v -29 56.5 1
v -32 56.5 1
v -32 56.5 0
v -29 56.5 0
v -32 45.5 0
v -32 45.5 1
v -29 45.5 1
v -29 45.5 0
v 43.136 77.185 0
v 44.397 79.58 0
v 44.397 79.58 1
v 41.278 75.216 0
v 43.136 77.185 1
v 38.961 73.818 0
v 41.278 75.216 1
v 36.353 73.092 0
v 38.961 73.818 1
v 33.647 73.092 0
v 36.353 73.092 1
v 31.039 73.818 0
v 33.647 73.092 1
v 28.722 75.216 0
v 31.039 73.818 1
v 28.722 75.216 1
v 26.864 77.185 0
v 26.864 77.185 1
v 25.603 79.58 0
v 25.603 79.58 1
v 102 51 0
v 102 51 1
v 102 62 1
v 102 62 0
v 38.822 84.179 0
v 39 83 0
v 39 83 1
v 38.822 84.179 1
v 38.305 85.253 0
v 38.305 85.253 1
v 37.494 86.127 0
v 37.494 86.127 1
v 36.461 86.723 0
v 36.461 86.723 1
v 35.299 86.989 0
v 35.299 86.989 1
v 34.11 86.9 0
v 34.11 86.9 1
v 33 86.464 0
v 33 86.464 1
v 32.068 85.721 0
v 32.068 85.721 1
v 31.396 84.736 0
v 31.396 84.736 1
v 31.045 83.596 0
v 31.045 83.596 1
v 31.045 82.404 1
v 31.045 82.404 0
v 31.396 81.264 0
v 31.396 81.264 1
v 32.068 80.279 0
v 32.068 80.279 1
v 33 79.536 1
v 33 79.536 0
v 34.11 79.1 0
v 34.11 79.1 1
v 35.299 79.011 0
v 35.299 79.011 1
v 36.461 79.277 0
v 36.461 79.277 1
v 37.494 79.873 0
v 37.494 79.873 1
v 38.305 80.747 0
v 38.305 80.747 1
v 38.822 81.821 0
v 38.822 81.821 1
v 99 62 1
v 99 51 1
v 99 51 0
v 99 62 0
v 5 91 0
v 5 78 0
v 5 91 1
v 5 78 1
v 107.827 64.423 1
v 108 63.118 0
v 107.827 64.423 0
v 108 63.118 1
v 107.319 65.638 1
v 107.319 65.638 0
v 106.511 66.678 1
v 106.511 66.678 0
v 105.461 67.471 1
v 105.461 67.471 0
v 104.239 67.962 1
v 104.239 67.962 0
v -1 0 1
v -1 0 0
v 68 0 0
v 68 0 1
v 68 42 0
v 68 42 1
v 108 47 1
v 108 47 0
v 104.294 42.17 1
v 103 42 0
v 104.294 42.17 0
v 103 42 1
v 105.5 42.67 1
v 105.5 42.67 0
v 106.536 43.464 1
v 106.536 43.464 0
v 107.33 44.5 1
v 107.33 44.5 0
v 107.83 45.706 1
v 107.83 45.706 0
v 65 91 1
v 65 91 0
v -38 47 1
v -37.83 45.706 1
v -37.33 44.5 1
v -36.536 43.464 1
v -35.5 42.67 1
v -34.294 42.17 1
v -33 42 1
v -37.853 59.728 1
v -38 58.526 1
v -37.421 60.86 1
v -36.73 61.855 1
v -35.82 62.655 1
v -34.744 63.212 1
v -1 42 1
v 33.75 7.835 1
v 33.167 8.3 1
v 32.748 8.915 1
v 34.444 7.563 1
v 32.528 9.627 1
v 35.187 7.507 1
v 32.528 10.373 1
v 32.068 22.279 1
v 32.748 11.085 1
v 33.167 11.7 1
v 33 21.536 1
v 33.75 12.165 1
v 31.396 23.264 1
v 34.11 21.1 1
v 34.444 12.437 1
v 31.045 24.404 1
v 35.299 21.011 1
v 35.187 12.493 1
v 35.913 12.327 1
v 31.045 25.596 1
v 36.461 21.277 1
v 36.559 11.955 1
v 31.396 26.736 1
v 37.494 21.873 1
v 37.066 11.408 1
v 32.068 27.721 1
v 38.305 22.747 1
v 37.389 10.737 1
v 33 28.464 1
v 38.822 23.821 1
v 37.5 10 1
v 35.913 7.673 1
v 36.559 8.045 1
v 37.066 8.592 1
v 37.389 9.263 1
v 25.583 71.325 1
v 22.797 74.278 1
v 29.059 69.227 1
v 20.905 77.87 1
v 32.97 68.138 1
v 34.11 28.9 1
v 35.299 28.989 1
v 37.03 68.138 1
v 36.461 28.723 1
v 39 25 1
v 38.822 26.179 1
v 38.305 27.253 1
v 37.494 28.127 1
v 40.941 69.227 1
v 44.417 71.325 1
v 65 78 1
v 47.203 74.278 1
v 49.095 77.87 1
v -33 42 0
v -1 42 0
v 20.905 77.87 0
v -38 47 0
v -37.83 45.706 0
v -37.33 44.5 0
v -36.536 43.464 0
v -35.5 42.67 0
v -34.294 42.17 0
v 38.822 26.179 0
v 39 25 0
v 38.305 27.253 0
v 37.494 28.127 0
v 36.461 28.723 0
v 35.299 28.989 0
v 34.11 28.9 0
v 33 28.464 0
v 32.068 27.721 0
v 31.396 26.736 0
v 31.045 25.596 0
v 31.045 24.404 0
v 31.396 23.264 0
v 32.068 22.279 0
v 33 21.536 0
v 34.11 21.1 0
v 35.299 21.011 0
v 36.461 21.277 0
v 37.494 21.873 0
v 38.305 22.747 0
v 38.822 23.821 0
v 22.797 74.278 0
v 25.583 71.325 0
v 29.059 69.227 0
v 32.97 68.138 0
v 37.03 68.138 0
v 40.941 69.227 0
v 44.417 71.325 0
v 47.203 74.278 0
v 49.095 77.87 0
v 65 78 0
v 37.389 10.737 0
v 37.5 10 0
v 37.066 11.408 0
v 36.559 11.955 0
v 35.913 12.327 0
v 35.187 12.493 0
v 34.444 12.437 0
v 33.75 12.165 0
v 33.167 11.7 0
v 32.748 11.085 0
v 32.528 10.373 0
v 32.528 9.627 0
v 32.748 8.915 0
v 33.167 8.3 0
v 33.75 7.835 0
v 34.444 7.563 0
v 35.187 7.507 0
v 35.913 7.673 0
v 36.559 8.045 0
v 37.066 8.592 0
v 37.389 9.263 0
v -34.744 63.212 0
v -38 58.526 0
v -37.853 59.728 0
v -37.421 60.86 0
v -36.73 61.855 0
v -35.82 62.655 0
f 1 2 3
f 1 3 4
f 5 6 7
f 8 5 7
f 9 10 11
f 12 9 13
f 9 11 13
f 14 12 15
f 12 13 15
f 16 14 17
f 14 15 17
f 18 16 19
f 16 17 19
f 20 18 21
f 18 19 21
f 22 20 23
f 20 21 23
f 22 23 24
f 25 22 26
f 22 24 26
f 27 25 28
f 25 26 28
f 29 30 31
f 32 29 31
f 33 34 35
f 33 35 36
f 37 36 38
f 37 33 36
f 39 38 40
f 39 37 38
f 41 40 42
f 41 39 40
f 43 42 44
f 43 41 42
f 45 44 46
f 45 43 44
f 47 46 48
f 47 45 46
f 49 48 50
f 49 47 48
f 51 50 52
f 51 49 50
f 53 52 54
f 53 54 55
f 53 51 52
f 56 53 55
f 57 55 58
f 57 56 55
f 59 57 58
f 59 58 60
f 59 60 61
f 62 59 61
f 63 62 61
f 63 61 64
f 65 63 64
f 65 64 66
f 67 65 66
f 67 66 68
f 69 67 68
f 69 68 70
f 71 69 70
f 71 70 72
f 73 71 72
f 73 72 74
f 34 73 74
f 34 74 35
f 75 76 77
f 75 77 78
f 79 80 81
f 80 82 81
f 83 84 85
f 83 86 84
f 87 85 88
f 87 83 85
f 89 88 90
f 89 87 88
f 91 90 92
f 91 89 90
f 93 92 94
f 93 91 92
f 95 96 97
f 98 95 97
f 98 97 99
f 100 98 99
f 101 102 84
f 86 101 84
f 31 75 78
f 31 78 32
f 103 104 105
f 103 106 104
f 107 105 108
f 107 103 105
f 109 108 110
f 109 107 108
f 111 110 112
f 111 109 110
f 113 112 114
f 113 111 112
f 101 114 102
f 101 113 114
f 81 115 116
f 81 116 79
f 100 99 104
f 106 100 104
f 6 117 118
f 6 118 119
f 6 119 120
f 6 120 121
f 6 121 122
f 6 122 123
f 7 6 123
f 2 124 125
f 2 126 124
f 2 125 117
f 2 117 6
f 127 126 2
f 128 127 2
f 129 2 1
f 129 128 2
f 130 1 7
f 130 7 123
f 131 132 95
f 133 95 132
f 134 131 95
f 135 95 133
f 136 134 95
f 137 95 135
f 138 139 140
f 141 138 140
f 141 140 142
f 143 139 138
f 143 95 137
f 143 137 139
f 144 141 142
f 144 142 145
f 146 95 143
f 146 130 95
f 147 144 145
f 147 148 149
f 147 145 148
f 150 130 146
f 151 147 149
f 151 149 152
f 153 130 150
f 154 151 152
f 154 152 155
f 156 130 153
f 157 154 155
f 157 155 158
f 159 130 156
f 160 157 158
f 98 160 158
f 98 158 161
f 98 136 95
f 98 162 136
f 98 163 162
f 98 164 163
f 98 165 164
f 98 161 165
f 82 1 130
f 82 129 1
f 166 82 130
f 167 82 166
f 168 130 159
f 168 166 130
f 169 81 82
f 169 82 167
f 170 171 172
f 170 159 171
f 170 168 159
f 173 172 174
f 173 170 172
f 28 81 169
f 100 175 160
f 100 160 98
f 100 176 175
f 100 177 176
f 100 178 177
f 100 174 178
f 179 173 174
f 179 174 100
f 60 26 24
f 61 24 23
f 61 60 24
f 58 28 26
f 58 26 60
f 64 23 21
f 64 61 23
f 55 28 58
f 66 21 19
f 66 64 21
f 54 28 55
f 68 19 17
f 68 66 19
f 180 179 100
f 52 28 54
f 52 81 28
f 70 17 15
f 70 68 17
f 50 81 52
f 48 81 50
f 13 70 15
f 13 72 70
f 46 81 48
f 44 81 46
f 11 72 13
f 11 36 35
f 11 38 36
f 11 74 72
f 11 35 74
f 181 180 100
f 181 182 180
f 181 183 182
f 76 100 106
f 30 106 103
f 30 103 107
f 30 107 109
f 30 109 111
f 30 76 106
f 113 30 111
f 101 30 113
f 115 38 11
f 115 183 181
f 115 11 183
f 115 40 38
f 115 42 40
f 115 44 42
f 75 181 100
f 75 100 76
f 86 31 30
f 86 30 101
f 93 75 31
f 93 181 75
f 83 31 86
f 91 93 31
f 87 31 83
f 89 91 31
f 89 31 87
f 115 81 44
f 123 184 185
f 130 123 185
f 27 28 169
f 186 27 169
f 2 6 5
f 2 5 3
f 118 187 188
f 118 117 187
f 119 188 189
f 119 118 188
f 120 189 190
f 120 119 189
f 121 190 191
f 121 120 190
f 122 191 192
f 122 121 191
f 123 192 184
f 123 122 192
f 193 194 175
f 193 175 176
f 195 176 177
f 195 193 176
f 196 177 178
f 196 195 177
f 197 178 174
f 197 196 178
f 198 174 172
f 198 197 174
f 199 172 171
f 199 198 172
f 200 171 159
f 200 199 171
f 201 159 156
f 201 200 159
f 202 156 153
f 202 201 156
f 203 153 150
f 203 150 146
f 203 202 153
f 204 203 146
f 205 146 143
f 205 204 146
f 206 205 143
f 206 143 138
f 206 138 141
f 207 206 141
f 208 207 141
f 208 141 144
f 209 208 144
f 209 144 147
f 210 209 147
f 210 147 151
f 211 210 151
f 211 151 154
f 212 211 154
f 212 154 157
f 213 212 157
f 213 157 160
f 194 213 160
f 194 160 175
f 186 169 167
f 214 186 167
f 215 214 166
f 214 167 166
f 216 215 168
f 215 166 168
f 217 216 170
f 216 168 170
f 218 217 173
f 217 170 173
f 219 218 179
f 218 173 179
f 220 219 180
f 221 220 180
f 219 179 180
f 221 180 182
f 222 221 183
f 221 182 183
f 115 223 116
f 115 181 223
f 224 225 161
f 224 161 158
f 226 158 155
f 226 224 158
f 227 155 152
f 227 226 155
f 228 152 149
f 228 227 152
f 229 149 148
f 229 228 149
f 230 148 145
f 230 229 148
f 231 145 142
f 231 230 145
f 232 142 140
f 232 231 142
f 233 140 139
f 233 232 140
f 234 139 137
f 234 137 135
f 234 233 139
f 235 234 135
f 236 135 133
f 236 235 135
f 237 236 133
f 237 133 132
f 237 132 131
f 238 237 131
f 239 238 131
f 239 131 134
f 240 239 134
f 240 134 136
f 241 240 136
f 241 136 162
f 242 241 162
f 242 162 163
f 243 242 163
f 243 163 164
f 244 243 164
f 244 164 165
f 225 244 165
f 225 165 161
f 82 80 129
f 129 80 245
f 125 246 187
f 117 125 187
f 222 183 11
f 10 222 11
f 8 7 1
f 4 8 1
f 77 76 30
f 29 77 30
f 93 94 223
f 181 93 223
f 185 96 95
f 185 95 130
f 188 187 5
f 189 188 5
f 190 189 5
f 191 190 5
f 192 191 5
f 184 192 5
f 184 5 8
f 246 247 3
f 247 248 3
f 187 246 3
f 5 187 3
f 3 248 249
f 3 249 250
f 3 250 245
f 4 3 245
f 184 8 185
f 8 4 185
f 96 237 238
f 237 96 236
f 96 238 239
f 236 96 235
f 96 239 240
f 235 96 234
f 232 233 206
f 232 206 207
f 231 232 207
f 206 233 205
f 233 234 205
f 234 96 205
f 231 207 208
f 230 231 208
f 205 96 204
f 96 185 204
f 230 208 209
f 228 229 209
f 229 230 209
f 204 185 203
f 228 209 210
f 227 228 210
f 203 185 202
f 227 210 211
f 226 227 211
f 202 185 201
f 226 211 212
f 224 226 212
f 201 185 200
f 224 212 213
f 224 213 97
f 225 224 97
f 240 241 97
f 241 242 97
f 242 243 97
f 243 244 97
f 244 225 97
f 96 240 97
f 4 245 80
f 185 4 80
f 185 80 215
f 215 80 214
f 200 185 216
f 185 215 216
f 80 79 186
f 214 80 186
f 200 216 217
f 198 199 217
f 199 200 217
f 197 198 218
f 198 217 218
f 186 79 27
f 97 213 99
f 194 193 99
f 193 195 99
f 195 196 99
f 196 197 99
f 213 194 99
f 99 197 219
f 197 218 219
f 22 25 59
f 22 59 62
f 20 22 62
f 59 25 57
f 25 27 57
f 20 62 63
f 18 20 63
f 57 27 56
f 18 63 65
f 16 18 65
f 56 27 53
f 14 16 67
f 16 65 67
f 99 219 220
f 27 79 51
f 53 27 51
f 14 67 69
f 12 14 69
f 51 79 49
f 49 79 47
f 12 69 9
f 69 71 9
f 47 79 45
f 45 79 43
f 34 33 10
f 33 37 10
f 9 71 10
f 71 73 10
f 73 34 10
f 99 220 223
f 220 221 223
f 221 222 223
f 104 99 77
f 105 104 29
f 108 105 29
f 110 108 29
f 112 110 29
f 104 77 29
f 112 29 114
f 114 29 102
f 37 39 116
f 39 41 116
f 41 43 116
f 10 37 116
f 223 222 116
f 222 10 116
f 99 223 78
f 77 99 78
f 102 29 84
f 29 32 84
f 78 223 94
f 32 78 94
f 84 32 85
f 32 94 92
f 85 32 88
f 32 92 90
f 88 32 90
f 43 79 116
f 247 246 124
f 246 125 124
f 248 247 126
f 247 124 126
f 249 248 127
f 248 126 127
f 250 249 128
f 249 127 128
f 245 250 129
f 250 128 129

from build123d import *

# Parameters (mm, degrees)
SKETCH1_W                    = 68
SKETCH1_H                    = 42
BOSS_EXTRUDE1_DEPTH          = 1
SKETCH3_W                    = 1
SKETCH3_H                    = 42
EXTRUDE_THIN1_DEPTH          = 20
SKETCH4_R                    = 5
CUT_EXTRUDE1_DEPTH           = 144.394560566
SKETCH6_W                    = 3
SKETCH6_H                    = 11
CUT_EXTRUDE2_DEPTH           = 143.779550356
SKETCH6_3_R                  = 4
BOSS_EXTRUDE2_DEPTH          = 15
SKETCH6_4_R                  = 2.5
SKETCH6_4_R_2                = 4
BOSS_EXTRUDE3_DEPTH          = 6
SKETCH7_W                    = 1
SKETCH7_H                    = 42
BOSS_EXTRUDE5_DEPTH          = 1
FILLET2_R                    = 5
SKETCH8_W                    = 60
SKETCH8_H                    = 1
BOSS_EXTRUDE6_DEPTH          = 20
CONVERT_SOLID1_START         = -20
CONVERT_SOLID1_OUTLINE_W     = 1
CONVERT_SOLID1_OUTLINE_H     = 42
CONVERT_SOLID1_OUTLINE_W_2   = 60
CONVERT_SOLID1_OUTLINE_H_2   = 1
CONVERT_SOLID1_DEPTH         = 20
CONVERT_SOLID1_2_OUTLINE_R   = 2.5
CONVERT_SOLID1_2_OUTLINE_R_2 = 4
CONVERT_SOLID1_2_DEPTH       = 16


# Read off the part's stored shape, not the designer's step: Convert-Solid1
with BuildPart() as part:
    # Sketch1 → Boss-Extrude1 (new body)
    with BuildSketch(Plane.XY):
        Polygon((-38, 62), (-38, 42), (0, 42), (68, 42), (108, 42), (108, 67), (65, 78), (65, 91), (5, 91), (5, 78), align=None)
        with Locations((34, 21)):
            Rectangle(SKETCH1_W, SKETCH1_H)
    extrude(amount=BOSS_EXTRUDE1_DEPTH)

    # Sketch3 → Extrude-Thin1 (add)
    with BuildSketch(Plane(origin=(0, 0, 0), x_dir=(-1, 0, 0), z_dir=(0, 0, -1))):
        with Locations((0.5, 21)):
            Rectangle(SKETCH3_W, SKETCH3_H)
        with Locations((-67.5, 21)):
            Rectangle(SKETCH3_W, SKETCH3_H)
    extrude(amount=EXTRUDE_THIN1_DEPTH)


with BuildPart() as extrude_thin1_piece_1:
    # of the separate pieces the step leaves, piece 1, a body of its own (extrude_thin1_pieces)
    add(part.part.solids().sort_by_distance((-38, 62, 0))[0])


with BuildPart() as extrude_thin1_piece_2:
    # of the separate pieces the step leaves, piece 2, a body of its own (extrude_thin1_pieces)
    add(part.part.solids().sort_by_distance((0, 42, -20))[0])


with BuildPart() as cut_extrude1_tool:
    # Sketch4 → Cut-Extrude1 (new, through all)
    with BuildSketch(Plane.ZY.offset(1)):
        with Locations((-9.5, 15)):
            Circle(SKETCH4_R)
    extrude(amount=-CUT_EXTRUDE1_DEPTH)


with BuildPart() as extrude_thin1_piece_1_1:
    add(extrude_thin1_piece_1.part)

    # Cut-Extrude1: cut by cut_extrude1_tool
    add(cut_extrude1_tool.part, mode=Mode.SUBTRACT)

    # Sketch6 → Cut-Extrude2 (cut, through all)
    with BuildSketch(Plane.XY.offset(1)):
        with Locations((100.5, 56.5)):
            Rectangle(SKETCH6_W, SKETCH6_H)
        with Locations((-30.5, 51)):
            Rectangle(SKETCH6_W, SKETCH6_H)
        with BuildLine():
            Line((49.095389312, 77.86969785), (44.396926208, 79.579798567))
            ThreePointArc((44.396926208, 79.579798567), (35, 73), (25.603073792, 79.579798567))
            Line((25.603073792, 79.579798567), (20.904610688, 77.86969785))
            ThreePointArc((20.904610688, 77.86969785), (35, 68), (49.095389312, 77.86969785))
        make_face()
    extrude(amount=-CUT_EXTRUDE2_DEPTH, mode=Mode.SUBTRACT)

    # Sketch6<3> → Boss-Extrude2 (add)
    with BuildSketch(Plane.XY.offset(1)):
        with Locations((35, 83)):
            Circle(SKETCH6_3_R)
    extrude(amount=BOSS_EXTRUDE2_DEPTH)

    # Sketch6<4> → Boss-Extrude3 (add)
    with BuildSketch(Plane.XY.offset(1)):
        with Locations((35, 10)):
            Circle(SKETCH6_4_R)
        with Locations((35, 25)):
            Circle(SKETCH6_4_R_2)
    extrude(amount=BOSS_EXTRUDE3_DEPTH)



with BuildPart() as extrude_thin1_piece_2_1:
    add(extrude_thin1_piece_2.part)

    # Cut-Extrude1: cut by cut_extrude1_tool
    add(cut_extrude1_tool.part, mode=Mode.SUBTRACT)


with BuildPart() as extrude_thin1_piece_1_2:
    add(extrude_thin1_piece_1_1.part)

    add(extrude_thin1_piece_2_1.part)  # Boss-Extrude5 merges Extrude-Thin1 piece 2
    # Sketch7 → Boss-Extrude5 (add)
    with BuildSketch(Plane.XY):
        with Locations((-0.5, 21)):
            Rectangle(SKETCH7_W, SKETCH7_H)
    extrude(amount=BOSS_EXTRUDE5_DEPTH)

    # Fillet2
    fillet2_edges = [extrude_thin1_piece_1_2.edges().sort_by_distance(p)[0] for p in [
        (-0.5, 0, -20),
        (-38, 42, 0.5),
        (-38, 62, 0.5),
        (67.5, 0, -20),
        (108, 42, 0.5),
        (108, 67, 0.5),
        (67.5, 42, -20),
        (-0.5, 42, -20),
    ]]
    fillet(fillet2_edges, radius=FILLET2_R)

    # Sketch8 → Boss-Extrude6 (add)
    with BuildSketch(Plane(origin=(0, 0, 0), x_dir=(-1, 0, 0), z_dir=(0, 0, -1))):
        with Locations((-35, 90.5)):
            Rectangle(SKETCH8_W, SKETCH8_H)
    extrude(amount=BOSS_EXTRUDE6_DEPTH)

    # Convert-Solid1 outline → Convert-Solid1 (cut)
    with BuildSketch(Plane.XY.offset(CONVERT_SOLID1_START)):
        with Locations((-0.5, 21)):
            Rectangle(CONVERT_SOLID1_OUTLINE_W, CONVERT_SOLID1_OUTLINE_H)
        with Locations((67.5, 21)):
            Rectangle(CONVERT_SOLID1_OUTLINE_W, CONVERT_SOLID1_OUTLINE_H)
        with Locations((35, 90.5)):
            Rectangle(CONVERT_SOLID1_OUTLINE_W_2, CONVERT_SOLID1_OUTLINE_H_2)
    extrude(amount=CONVERT_SOLID1_DEPTH, mode=Mode.SUBTRACT)

    # Convert-Solid1 2 outline → Convert-Solid1 2 (cut)
    with BuildSketch(Plane.XY):
        with Locations((35, 10)):
            Circle(CONVERT_SOLID1_2_OUTLINE_R)
        with Locations((35, 25)):
            Circle(CONVERT_SOLID1_2_OUTLINE_R_2)
        with Locations((35, 83)):
            Circle(CONVERT_SOLID1_2_OUTLINE_R_2)
    extrude(amount=CONVERT_SOLID1_2_DEPTH, mode=Mode.SUBTRACT)


solid = extrude_thin1_piece_1_2.part
